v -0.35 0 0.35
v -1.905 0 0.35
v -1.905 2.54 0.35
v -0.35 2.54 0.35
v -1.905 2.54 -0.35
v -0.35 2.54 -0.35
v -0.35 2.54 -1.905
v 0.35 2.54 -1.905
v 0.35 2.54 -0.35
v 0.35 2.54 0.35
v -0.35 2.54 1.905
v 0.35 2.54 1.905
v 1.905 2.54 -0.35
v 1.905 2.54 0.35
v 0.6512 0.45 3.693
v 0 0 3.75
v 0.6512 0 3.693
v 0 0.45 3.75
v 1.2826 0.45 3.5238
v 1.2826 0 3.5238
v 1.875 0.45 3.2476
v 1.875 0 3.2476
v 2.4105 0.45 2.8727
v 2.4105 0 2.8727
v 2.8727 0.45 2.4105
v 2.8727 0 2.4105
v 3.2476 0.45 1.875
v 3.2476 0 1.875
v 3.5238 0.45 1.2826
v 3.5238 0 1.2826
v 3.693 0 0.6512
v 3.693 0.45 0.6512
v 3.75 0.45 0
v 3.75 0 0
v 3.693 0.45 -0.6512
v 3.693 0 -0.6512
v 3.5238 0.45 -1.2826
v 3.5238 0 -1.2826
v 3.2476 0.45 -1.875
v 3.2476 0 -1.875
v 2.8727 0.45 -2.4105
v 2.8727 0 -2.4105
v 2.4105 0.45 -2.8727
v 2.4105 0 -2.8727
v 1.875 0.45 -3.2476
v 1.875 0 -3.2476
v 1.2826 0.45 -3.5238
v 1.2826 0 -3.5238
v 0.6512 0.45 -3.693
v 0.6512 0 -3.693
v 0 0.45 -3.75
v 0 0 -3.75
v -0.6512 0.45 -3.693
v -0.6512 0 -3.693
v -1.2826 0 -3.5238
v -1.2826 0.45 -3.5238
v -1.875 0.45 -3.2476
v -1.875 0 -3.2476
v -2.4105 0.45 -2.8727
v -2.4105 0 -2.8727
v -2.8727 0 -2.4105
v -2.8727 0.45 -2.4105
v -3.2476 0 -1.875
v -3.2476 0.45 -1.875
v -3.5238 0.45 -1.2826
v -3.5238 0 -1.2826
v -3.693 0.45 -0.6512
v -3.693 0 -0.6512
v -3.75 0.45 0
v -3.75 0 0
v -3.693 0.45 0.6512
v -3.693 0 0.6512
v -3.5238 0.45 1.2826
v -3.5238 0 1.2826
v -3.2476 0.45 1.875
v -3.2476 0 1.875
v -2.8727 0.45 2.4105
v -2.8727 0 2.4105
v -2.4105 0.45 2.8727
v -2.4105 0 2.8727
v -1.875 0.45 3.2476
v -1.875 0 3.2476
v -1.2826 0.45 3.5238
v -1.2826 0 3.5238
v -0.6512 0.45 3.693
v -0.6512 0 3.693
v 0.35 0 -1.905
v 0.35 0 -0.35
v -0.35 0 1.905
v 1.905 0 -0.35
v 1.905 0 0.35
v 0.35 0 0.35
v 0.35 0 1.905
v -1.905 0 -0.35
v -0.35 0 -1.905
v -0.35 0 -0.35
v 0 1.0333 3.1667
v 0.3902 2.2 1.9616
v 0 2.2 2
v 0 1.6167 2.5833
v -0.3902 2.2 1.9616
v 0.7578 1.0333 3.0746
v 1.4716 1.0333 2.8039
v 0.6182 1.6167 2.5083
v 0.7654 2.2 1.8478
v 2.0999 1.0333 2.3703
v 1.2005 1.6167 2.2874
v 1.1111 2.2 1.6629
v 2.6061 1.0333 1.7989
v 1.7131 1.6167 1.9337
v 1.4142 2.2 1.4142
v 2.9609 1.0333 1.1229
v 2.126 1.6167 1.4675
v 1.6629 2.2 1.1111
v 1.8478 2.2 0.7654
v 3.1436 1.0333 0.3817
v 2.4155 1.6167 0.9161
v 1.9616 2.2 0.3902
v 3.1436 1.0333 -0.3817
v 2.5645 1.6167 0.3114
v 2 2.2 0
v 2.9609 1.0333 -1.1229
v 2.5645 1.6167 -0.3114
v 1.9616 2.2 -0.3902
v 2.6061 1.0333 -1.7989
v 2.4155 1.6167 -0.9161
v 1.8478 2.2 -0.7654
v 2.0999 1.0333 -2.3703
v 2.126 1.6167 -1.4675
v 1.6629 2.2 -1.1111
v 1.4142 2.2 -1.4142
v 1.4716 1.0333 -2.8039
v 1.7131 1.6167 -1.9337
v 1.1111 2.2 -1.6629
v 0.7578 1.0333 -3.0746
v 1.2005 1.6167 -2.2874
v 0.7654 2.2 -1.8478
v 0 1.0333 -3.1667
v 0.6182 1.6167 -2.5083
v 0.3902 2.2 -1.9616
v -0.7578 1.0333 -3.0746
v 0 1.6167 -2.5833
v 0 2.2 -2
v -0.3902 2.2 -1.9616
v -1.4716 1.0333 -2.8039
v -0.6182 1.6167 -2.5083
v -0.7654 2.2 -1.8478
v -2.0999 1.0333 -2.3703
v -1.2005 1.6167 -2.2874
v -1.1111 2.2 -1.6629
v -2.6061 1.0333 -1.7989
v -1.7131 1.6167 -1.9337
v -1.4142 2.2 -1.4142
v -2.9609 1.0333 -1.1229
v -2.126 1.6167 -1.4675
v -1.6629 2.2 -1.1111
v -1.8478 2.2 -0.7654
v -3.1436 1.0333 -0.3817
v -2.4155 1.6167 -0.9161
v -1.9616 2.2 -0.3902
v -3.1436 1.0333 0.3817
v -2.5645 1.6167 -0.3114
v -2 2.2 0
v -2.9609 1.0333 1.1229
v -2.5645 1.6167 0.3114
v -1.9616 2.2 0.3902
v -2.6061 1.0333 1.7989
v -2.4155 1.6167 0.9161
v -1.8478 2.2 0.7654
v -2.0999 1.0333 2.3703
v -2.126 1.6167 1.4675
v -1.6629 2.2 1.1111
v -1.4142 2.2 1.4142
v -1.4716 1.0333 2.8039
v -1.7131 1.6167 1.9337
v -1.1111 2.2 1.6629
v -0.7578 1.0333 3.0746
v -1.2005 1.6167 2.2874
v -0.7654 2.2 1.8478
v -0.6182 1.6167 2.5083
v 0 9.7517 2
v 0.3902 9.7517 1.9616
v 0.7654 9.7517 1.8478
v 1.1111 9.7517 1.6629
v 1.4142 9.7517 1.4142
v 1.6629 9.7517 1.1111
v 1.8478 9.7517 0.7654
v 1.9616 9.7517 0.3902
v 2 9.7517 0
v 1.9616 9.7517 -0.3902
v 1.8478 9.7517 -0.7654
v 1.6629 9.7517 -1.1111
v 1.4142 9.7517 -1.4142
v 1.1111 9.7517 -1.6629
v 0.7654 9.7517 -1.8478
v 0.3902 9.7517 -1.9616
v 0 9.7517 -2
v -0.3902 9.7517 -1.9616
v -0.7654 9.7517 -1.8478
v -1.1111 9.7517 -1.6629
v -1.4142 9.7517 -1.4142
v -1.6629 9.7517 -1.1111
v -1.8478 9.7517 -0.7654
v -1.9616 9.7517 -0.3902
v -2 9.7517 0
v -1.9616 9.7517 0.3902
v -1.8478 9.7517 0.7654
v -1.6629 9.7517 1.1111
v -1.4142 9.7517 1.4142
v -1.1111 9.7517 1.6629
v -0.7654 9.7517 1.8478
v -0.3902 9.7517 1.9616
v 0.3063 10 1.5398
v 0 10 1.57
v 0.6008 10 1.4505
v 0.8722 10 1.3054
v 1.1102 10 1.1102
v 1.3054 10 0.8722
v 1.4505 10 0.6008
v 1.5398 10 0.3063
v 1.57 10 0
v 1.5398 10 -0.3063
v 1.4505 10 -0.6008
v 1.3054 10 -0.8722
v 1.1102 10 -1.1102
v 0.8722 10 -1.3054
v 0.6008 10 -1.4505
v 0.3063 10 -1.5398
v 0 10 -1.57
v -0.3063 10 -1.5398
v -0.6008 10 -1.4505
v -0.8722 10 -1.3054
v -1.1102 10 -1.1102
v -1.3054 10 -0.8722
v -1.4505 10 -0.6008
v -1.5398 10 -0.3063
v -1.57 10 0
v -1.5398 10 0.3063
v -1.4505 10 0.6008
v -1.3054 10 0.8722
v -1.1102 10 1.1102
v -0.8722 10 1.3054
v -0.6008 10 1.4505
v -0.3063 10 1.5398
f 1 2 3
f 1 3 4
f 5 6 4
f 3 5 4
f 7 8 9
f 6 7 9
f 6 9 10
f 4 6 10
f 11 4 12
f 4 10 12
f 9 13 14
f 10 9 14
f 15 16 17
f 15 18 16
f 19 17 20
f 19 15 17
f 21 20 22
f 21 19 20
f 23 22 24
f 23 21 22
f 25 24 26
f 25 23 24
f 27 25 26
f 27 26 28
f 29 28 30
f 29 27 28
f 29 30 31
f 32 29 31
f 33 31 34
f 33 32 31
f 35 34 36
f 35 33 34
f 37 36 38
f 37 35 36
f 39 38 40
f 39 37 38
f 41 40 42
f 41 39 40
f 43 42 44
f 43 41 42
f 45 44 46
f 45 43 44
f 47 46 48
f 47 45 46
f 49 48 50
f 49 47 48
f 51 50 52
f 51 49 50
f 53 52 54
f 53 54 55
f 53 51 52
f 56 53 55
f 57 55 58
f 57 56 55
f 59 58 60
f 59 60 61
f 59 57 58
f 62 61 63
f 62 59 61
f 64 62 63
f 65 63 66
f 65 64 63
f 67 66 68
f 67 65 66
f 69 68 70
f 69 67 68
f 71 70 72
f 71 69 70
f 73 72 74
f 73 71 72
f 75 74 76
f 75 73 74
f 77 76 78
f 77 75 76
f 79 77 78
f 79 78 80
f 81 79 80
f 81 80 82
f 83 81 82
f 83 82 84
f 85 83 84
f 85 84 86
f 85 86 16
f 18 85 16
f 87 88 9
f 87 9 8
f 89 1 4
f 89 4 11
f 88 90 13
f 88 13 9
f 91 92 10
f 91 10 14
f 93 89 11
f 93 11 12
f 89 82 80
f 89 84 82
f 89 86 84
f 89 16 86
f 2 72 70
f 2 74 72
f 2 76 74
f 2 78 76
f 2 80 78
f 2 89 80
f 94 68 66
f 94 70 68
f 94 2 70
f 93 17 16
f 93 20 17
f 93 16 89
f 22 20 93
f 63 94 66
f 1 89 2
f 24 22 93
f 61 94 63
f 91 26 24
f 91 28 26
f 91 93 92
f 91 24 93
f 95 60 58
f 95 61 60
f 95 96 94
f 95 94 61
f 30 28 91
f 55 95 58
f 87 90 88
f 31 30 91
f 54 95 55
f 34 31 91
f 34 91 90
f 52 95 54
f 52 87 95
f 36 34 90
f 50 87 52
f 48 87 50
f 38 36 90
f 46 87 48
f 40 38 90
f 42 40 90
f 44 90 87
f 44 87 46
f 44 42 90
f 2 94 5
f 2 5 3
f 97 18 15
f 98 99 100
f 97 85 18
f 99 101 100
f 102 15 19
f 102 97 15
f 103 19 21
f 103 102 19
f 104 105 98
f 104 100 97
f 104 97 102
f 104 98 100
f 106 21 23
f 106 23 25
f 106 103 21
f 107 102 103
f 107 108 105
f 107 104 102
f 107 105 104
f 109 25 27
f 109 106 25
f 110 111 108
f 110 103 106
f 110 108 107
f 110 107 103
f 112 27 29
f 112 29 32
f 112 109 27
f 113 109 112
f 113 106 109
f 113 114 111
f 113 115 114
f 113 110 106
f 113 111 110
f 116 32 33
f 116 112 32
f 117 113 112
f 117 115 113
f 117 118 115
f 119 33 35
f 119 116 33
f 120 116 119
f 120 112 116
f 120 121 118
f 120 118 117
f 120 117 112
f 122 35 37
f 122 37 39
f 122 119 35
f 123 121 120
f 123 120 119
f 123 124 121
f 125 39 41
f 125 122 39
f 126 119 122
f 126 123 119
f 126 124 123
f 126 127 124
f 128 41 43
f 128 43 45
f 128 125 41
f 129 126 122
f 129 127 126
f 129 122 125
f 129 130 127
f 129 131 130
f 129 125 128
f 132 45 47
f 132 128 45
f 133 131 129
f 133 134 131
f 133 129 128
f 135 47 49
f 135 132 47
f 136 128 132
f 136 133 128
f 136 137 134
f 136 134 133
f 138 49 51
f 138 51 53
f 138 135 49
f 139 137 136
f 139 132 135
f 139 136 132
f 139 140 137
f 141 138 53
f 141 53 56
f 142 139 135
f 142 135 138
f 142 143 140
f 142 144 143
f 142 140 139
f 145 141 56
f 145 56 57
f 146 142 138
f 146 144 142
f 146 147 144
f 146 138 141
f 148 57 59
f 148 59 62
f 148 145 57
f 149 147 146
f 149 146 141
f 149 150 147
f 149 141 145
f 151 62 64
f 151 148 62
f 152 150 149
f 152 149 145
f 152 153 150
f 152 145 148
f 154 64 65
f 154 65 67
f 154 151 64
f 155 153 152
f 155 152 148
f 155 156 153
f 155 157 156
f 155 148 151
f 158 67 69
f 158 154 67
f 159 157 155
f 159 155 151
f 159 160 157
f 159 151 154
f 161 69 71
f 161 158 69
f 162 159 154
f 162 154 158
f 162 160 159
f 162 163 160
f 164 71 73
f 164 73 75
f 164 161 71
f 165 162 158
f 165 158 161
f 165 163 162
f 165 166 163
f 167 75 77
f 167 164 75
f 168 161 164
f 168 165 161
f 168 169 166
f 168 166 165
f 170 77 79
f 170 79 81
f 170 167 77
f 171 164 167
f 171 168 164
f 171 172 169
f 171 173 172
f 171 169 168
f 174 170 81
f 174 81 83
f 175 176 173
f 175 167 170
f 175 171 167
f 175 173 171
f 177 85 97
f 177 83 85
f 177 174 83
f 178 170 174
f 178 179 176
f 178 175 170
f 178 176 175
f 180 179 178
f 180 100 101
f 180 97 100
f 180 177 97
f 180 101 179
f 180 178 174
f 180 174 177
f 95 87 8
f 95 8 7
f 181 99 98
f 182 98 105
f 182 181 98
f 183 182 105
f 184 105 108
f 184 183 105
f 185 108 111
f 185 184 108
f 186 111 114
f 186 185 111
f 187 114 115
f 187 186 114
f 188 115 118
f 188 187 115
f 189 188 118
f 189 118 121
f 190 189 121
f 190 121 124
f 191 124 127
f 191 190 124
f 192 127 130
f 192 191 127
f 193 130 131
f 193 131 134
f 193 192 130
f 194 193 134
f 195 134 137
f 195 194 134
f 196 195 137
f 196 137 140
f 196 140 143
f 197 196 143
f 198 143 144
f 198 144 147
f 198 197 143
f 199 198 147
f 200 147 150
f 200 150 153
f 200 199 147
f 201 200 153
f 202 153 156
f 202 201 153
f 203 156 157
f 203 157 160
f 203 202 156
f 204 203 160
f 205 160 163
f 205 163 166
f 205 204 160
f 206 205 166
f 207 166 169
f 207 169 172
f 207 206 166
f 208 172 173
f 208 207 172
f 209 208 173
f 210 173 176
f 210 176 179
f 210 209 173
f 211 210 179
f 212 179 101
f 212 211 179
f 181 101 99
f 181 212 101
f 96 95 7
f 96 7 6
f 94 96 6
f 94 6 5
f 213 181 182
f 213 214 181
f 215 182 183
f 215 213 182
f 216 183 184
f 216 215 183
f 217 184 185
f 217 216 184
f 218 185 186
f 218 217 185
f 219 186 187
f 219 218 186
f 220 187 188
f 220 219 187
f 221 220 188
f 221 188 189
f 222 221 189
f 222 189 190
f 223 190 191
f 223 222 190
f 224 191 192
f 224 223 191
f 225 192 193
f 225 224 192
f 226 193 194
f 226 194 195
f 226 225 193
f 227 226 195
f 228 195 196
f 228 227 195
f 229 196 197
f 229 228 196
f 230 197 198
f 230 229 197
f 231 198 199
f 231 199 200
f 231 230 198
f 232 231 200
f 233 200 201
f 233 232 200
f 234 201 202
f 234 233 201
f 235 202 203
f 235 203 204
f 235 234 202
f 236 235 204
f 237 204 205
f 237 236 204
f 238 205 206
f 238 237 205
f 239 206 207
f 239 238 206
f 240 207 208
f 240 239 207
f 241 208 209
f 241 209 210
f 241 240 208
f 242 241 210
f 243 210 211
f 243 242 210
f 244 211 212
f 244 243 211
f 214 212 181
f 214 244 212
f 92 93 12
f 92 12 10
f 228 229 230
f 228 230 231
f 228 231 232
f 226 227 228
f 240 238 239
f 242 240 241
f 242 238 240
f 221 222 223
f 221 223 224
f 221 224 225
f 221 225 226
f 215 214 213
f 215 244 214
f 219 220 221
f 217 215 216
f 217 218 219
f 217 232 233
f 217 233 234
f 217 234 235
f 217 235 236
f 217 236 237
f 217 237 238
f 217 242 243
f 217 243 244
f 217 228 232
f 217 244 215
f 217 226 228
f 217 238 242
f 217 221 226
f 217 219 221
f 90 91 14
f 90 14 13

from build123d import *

# Parameters (mm, degrees)
POCKET_DEPTH = 2.54


with BuildPart() as part:
    # Sketch → Revolution (revolve)
    with BuildSketch(Plane.YZ):
        Polygon((0, 0), (0, 3.75), (0.45, 3.75), (2.2, 2), (9.751739, 2), (10, 1.57), (10, 0), align=None)
    revolve(axis=Axis((0, 0, 0), (0, 1, 0)))

    # Sketch001 → Pocket (cut)
    with BuildSketch(Plane(origin=(0, 0, 0), x_dir=(0, 0, -1), z_dir=(0, -1, 0))):
        Polygon((-1.905, 0.35), (-0.35, 0.35), (-0.35, 1.905), (0.35, 1.905), (0.35, 0.35), (1.905, 0.35), (1.905, -0.35), (0.35, -0.35), (0.35, -1.905), (-0.35, -1.905), (-0.35, -0.35), (-1.905, -0.35), align=None)
    extrude(amount=-POCKET_DEPTH, mode=Mode.SUBTRACT)


solid = part.part
